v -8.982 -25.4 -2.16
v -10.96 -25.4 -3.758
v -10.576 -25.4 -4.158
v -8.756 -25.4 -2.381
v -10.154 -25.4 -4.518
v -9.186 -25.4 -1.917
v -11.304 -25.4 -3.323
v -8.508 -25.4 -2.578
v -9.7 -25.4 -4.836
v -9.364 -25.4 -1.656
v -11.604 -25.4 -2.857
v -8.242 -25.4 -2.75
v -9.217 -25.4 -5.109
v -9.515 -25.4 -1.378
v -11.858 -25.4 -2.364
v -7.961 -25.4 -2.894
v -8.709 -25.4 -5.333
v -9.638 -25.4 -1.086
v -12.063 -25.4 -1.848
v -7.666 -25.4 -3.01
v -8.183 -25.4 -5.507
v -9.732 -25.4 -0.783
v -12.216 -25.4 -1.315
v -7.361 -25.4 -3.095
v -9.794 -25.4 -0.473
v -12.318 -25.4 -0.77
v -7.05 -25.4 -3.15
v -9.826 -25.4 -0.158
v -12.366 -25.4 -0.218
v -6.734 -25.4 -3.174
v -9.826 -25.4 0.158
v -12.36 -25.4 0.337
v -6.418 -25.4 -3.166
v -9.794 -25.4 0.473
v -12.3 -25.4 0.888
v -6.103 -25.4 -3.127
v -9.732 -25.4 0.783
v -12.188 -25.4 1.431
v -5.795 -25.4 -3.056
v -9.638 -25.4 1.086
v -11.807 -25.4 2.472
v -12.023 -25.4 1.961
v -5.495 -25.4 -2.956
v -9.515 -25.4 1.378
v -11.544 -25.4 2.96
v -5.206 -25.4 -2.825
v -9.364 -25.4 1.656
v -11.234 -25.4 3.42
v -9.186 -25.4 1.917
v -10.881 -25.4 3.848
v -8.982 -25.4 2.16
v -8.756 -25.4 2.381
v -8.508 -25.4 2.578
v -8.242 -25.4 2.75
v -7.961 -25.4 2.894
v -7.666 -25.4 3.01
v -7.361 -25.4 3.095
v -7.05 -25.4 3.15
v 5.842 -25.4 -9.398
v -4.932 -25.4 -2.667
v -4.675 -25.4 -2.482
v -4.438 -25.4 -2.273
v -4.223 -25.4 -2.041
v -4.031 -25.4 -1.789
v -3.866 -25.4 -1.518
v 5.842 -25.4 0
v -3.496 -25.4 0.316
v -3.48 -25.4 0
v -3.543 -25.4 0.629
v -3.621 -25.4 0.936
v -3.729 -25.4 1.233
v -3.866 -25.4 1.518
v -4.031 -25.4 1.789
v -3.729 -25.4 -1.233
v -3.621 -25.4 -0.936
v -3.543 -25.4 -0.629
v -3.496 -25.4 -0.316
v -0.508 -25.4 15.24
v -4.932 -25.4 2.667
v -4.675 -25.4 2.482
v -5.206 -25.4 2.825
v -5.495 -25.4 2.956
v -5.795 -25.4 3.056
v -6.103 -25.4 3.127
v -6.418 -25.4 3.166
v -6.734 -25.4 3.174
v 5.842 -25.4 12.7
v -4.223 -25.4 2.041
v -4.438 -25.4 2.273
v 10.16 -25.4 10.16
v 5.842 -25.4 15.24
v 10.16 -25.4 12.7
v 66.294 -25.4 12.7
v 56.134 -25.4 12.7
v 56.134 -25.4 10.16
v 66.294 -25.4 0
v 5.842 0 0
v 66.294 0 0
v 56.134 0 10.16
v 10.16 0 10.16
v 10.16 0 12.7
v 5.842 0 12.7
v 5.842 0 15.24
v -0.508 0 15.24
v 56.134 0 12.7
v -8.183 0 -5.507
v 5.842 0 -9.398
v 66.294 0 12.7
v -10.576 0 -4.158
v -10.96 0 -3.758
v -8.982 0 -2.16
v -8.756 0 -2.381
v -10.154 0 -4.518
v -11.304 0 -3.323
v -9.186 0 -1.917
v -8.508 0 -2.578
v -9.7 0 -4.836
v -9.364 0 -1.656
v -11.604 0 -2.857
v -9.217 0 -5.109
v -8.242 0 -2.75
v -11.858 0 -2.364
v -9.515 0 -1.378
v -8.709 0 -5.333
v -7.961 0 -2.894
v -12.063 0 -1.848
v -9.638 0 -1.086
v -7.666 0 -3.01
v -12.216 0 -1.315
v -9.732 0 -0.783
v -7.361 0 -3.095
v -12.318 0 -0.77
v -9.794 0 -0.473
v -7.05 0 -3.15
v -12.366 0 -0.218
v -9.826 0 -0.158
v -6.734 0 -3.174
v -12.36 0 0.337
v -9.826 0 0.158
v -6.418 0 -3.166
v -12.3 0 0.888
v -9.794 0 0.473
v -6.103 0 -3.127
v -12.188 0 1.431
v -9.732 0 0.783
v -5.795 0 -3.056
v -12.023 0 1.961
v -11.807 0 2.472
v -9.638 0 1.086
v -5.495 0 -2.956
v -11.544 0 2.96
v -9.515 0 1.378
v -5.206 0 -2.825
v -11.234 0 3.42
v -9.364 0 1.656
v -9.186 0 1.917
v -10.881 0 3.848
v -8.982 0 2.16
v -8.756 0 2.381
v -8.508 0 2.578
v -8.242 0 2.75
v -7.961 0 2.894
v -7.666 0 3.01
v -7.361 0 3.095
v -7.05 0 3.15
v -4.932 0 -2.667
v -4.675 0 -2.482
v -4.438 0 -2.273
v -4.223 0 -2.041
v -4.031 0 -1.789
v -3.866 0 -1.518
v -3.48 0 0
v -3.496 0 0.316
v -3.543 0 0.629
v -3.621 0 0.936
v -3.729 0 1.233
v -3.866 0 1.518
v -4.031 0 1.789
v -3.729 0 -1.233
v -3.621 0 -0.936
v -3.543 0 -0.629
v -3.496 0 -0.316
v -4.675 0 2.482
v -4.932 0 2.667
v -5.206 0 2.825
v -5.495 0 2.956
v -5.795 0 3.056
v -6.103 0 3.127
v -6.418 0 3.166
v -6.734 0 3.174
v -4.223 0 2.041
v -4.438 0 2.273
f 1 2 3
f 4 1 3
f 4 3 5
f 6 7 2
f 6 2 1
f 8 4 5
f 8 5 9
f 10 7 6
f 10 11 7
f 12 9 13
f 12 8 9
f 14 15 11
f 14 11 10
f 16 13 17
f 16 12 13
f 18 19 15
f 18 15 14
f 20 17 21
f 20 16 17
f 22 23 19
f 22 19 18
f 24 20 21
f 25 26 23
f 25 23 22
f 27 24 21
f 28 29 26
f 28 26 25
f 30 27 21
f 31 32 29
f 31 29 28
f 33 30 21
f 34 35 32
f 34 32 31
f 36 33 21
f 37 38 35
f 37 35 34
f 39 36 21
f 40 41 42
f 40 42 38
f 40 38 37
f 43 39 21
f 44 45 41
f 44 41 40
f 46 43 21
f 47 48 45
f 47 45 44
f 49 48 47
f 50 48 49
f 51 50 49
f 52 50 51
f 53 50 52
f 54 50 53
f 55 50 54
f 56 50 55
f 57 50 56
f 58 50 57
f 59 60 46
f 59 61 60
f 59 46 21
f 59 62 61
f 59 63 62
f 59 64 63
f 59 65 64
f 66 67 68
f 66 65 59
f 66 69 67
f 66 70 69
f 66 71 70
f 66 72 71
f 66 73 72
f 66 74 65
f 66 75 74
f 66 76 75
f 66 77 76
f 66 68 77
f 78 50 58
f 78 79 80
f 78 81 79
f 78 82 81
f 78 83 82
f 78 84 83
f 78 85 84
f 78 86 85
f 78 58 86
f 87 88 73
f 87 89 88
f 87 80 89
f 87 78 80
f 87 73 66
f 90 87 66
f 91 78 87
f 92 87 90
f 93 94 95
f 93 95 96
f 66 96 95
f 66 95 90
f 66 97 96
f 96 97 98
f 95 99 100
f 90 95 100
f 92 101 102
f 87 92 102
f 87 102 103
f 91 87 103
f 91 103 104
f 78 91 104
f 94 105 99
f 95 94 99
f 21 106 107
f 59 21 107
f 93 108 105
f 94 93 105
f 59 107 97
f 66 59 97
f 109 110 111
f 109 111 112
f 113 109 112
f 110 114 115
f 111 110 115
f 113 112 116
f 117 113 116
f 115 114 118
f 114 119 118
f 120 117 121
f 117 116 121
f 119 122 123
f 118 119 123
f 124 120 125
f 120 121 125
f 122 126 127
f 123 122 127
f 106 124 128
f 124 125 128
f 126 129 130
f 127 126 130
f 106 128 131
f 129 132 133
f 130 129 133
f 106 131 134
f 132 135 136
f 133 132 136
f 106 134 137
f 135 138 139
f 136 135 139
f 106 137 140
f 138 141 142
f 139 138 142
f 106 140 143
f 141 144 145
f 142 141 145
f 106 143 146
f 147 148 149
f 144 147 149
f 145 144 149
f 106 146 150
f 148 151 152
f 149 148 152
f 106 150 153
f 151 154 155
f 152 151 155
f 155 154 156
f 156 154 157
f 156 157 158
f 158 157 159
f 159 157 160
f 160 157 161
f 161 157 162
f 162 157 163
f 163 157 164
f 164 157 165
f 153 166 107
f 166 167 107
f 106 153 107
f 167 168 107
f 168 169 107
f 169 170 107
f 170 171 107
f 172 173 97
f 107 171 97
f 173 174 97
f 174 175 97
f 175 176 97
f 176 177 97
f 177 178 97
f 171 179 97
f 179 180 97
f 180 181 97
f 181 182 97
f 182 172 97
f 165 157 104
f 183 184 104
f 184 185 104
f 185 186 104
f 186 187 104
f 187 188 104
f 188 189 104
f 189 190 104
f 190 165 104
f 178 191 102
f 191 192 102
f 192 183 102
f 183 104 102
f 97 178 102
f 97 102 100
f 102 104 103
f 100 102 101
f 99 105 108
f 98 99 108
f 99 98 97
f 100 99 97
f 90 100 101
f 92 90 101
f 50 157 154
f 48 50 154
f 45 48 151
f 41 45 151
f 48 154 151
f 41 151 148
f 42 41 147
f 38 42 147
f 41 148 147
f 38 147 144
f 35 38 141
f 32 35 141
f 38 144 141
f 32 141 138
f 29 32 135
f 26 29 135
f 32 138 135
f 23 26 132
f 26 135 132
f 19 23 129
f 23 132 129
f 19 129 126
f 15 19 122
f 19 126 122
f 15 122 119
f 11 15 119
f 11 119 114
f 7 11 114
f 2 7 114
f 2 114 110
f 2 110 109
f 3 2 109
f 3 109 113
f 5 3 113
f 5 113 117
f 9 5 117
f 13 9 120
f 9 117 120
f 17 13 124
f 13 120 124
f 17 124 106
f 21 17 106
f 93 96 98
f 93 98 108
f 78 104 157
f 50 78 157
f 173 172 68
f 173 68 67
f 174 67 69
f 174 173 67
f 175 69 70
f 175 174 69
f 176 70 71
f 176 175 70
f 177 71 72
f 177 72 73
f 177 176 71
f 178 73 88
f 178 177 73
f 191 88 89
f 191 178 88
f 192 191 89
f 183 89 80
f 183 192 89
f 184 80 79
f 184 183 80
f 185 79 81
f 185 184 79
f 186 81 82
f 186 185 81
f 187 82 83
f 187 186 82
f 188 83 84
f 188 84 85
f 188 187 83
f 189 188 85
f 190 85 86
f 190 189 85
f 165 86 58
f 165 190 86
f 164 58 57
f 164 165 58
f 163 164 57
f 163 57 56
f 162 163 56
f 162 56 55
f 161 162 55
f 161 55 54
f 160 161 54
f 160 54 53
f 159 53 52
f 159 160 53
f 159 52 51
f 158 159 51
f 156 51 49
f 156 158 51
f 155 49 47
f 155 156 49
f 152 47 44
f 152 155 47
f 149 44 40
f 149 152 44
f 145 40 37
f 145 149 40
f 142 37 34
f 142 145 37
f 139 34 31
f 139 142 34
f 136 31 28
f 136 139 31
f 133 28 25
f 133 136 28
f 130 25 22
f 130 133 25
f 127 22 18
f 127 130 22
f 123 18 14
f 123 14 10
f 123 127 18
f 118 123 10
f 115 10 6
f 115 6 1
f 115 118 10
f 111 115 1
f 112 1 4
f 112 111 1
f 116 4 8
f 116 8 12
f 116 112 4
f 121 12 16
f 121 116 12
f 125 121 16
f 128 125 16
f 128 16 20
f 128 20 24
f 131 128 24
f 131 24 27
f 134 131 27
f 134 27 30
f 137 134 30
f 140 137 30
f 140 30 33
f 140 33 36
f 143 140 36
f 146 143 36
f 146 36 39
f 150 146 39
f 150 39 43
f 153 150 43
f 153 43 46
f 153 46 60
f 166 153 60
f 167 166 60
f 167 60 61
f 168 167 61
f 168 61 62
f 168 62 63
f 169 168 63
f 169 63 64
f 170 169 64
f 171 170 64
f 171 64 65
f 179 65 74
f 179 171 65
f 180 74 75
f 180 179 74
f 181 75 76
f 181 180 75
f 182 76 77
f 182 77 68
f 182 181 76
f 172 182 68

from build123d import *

# Parameters (mm, degrees)
F0_W     = 5.842
F0_H     = 12.7
F0_R     = 3.175
F1_DEPTH = 25.4


with BuildPart() as f1:
    # F0 (on Front) → F1 (new body)
    with BuildSketch(Plane.XZ):
        Polygon((5.842, 12.7), (5.842, 0), (66.294, 0), (66.294, 12.7), (56.134, 12.7), (56.134, 10.16), (10.16, 10.16), (10.16, 12.7), align=None)
        with Locations((2.921, 6.35)):
            Rectangle(F0_W, F0_H)
        with BuildLine():
            Line((-0.9398, 0), (0, 0))
            Line((0, 0), (0, 12.7))
            Line((0, 12.7), (5.842, 12.7))
            Line((5.842, 12.7), (5.842, 15.24))
            Line((5.842, 15.24), (-0.508, 15.24))
            Line((-0.508, 15.24), (-10.88063, 3.847543))
            ThreePointArc((-10.88063, 3.847543), (-4.591961, 5.329721), (-0.9398, 0))
        make_face()
        with BuildLine():
            Line((5.842, 0), (0, 0))
            Line((0, 0), (-0.9398, 0))
            ThreePointArc((-0.9398, 0), (-3.195791, -4.549339), (-8.182663, -5.506983))
            Line((-8.182663, -5.506983), (5.842, -9.398))
            Line((5.842, -9.398), (5.842, 0))
        make_face()
        with BuildLine():
            ThreePointArc((-8.182663, -5.506983), (-3.195791, -4.549339), (-0.9398, 0))
            ThreePointArc((-0.9398, 0), (-4.591961, 5.329721), (-10.88063, 3.847543))
            ThreePointArc((-10.88063, 3.847543), (-12.145978, -1.583727), (-8.182663, -5.506983))
        make_face()
        with Locations((-6.6548, 0)):
            Circle(F0_R, mode=Mode.SUBTRACT)
    extrude(amount=F1_DEPTH)


solid = f1.part
